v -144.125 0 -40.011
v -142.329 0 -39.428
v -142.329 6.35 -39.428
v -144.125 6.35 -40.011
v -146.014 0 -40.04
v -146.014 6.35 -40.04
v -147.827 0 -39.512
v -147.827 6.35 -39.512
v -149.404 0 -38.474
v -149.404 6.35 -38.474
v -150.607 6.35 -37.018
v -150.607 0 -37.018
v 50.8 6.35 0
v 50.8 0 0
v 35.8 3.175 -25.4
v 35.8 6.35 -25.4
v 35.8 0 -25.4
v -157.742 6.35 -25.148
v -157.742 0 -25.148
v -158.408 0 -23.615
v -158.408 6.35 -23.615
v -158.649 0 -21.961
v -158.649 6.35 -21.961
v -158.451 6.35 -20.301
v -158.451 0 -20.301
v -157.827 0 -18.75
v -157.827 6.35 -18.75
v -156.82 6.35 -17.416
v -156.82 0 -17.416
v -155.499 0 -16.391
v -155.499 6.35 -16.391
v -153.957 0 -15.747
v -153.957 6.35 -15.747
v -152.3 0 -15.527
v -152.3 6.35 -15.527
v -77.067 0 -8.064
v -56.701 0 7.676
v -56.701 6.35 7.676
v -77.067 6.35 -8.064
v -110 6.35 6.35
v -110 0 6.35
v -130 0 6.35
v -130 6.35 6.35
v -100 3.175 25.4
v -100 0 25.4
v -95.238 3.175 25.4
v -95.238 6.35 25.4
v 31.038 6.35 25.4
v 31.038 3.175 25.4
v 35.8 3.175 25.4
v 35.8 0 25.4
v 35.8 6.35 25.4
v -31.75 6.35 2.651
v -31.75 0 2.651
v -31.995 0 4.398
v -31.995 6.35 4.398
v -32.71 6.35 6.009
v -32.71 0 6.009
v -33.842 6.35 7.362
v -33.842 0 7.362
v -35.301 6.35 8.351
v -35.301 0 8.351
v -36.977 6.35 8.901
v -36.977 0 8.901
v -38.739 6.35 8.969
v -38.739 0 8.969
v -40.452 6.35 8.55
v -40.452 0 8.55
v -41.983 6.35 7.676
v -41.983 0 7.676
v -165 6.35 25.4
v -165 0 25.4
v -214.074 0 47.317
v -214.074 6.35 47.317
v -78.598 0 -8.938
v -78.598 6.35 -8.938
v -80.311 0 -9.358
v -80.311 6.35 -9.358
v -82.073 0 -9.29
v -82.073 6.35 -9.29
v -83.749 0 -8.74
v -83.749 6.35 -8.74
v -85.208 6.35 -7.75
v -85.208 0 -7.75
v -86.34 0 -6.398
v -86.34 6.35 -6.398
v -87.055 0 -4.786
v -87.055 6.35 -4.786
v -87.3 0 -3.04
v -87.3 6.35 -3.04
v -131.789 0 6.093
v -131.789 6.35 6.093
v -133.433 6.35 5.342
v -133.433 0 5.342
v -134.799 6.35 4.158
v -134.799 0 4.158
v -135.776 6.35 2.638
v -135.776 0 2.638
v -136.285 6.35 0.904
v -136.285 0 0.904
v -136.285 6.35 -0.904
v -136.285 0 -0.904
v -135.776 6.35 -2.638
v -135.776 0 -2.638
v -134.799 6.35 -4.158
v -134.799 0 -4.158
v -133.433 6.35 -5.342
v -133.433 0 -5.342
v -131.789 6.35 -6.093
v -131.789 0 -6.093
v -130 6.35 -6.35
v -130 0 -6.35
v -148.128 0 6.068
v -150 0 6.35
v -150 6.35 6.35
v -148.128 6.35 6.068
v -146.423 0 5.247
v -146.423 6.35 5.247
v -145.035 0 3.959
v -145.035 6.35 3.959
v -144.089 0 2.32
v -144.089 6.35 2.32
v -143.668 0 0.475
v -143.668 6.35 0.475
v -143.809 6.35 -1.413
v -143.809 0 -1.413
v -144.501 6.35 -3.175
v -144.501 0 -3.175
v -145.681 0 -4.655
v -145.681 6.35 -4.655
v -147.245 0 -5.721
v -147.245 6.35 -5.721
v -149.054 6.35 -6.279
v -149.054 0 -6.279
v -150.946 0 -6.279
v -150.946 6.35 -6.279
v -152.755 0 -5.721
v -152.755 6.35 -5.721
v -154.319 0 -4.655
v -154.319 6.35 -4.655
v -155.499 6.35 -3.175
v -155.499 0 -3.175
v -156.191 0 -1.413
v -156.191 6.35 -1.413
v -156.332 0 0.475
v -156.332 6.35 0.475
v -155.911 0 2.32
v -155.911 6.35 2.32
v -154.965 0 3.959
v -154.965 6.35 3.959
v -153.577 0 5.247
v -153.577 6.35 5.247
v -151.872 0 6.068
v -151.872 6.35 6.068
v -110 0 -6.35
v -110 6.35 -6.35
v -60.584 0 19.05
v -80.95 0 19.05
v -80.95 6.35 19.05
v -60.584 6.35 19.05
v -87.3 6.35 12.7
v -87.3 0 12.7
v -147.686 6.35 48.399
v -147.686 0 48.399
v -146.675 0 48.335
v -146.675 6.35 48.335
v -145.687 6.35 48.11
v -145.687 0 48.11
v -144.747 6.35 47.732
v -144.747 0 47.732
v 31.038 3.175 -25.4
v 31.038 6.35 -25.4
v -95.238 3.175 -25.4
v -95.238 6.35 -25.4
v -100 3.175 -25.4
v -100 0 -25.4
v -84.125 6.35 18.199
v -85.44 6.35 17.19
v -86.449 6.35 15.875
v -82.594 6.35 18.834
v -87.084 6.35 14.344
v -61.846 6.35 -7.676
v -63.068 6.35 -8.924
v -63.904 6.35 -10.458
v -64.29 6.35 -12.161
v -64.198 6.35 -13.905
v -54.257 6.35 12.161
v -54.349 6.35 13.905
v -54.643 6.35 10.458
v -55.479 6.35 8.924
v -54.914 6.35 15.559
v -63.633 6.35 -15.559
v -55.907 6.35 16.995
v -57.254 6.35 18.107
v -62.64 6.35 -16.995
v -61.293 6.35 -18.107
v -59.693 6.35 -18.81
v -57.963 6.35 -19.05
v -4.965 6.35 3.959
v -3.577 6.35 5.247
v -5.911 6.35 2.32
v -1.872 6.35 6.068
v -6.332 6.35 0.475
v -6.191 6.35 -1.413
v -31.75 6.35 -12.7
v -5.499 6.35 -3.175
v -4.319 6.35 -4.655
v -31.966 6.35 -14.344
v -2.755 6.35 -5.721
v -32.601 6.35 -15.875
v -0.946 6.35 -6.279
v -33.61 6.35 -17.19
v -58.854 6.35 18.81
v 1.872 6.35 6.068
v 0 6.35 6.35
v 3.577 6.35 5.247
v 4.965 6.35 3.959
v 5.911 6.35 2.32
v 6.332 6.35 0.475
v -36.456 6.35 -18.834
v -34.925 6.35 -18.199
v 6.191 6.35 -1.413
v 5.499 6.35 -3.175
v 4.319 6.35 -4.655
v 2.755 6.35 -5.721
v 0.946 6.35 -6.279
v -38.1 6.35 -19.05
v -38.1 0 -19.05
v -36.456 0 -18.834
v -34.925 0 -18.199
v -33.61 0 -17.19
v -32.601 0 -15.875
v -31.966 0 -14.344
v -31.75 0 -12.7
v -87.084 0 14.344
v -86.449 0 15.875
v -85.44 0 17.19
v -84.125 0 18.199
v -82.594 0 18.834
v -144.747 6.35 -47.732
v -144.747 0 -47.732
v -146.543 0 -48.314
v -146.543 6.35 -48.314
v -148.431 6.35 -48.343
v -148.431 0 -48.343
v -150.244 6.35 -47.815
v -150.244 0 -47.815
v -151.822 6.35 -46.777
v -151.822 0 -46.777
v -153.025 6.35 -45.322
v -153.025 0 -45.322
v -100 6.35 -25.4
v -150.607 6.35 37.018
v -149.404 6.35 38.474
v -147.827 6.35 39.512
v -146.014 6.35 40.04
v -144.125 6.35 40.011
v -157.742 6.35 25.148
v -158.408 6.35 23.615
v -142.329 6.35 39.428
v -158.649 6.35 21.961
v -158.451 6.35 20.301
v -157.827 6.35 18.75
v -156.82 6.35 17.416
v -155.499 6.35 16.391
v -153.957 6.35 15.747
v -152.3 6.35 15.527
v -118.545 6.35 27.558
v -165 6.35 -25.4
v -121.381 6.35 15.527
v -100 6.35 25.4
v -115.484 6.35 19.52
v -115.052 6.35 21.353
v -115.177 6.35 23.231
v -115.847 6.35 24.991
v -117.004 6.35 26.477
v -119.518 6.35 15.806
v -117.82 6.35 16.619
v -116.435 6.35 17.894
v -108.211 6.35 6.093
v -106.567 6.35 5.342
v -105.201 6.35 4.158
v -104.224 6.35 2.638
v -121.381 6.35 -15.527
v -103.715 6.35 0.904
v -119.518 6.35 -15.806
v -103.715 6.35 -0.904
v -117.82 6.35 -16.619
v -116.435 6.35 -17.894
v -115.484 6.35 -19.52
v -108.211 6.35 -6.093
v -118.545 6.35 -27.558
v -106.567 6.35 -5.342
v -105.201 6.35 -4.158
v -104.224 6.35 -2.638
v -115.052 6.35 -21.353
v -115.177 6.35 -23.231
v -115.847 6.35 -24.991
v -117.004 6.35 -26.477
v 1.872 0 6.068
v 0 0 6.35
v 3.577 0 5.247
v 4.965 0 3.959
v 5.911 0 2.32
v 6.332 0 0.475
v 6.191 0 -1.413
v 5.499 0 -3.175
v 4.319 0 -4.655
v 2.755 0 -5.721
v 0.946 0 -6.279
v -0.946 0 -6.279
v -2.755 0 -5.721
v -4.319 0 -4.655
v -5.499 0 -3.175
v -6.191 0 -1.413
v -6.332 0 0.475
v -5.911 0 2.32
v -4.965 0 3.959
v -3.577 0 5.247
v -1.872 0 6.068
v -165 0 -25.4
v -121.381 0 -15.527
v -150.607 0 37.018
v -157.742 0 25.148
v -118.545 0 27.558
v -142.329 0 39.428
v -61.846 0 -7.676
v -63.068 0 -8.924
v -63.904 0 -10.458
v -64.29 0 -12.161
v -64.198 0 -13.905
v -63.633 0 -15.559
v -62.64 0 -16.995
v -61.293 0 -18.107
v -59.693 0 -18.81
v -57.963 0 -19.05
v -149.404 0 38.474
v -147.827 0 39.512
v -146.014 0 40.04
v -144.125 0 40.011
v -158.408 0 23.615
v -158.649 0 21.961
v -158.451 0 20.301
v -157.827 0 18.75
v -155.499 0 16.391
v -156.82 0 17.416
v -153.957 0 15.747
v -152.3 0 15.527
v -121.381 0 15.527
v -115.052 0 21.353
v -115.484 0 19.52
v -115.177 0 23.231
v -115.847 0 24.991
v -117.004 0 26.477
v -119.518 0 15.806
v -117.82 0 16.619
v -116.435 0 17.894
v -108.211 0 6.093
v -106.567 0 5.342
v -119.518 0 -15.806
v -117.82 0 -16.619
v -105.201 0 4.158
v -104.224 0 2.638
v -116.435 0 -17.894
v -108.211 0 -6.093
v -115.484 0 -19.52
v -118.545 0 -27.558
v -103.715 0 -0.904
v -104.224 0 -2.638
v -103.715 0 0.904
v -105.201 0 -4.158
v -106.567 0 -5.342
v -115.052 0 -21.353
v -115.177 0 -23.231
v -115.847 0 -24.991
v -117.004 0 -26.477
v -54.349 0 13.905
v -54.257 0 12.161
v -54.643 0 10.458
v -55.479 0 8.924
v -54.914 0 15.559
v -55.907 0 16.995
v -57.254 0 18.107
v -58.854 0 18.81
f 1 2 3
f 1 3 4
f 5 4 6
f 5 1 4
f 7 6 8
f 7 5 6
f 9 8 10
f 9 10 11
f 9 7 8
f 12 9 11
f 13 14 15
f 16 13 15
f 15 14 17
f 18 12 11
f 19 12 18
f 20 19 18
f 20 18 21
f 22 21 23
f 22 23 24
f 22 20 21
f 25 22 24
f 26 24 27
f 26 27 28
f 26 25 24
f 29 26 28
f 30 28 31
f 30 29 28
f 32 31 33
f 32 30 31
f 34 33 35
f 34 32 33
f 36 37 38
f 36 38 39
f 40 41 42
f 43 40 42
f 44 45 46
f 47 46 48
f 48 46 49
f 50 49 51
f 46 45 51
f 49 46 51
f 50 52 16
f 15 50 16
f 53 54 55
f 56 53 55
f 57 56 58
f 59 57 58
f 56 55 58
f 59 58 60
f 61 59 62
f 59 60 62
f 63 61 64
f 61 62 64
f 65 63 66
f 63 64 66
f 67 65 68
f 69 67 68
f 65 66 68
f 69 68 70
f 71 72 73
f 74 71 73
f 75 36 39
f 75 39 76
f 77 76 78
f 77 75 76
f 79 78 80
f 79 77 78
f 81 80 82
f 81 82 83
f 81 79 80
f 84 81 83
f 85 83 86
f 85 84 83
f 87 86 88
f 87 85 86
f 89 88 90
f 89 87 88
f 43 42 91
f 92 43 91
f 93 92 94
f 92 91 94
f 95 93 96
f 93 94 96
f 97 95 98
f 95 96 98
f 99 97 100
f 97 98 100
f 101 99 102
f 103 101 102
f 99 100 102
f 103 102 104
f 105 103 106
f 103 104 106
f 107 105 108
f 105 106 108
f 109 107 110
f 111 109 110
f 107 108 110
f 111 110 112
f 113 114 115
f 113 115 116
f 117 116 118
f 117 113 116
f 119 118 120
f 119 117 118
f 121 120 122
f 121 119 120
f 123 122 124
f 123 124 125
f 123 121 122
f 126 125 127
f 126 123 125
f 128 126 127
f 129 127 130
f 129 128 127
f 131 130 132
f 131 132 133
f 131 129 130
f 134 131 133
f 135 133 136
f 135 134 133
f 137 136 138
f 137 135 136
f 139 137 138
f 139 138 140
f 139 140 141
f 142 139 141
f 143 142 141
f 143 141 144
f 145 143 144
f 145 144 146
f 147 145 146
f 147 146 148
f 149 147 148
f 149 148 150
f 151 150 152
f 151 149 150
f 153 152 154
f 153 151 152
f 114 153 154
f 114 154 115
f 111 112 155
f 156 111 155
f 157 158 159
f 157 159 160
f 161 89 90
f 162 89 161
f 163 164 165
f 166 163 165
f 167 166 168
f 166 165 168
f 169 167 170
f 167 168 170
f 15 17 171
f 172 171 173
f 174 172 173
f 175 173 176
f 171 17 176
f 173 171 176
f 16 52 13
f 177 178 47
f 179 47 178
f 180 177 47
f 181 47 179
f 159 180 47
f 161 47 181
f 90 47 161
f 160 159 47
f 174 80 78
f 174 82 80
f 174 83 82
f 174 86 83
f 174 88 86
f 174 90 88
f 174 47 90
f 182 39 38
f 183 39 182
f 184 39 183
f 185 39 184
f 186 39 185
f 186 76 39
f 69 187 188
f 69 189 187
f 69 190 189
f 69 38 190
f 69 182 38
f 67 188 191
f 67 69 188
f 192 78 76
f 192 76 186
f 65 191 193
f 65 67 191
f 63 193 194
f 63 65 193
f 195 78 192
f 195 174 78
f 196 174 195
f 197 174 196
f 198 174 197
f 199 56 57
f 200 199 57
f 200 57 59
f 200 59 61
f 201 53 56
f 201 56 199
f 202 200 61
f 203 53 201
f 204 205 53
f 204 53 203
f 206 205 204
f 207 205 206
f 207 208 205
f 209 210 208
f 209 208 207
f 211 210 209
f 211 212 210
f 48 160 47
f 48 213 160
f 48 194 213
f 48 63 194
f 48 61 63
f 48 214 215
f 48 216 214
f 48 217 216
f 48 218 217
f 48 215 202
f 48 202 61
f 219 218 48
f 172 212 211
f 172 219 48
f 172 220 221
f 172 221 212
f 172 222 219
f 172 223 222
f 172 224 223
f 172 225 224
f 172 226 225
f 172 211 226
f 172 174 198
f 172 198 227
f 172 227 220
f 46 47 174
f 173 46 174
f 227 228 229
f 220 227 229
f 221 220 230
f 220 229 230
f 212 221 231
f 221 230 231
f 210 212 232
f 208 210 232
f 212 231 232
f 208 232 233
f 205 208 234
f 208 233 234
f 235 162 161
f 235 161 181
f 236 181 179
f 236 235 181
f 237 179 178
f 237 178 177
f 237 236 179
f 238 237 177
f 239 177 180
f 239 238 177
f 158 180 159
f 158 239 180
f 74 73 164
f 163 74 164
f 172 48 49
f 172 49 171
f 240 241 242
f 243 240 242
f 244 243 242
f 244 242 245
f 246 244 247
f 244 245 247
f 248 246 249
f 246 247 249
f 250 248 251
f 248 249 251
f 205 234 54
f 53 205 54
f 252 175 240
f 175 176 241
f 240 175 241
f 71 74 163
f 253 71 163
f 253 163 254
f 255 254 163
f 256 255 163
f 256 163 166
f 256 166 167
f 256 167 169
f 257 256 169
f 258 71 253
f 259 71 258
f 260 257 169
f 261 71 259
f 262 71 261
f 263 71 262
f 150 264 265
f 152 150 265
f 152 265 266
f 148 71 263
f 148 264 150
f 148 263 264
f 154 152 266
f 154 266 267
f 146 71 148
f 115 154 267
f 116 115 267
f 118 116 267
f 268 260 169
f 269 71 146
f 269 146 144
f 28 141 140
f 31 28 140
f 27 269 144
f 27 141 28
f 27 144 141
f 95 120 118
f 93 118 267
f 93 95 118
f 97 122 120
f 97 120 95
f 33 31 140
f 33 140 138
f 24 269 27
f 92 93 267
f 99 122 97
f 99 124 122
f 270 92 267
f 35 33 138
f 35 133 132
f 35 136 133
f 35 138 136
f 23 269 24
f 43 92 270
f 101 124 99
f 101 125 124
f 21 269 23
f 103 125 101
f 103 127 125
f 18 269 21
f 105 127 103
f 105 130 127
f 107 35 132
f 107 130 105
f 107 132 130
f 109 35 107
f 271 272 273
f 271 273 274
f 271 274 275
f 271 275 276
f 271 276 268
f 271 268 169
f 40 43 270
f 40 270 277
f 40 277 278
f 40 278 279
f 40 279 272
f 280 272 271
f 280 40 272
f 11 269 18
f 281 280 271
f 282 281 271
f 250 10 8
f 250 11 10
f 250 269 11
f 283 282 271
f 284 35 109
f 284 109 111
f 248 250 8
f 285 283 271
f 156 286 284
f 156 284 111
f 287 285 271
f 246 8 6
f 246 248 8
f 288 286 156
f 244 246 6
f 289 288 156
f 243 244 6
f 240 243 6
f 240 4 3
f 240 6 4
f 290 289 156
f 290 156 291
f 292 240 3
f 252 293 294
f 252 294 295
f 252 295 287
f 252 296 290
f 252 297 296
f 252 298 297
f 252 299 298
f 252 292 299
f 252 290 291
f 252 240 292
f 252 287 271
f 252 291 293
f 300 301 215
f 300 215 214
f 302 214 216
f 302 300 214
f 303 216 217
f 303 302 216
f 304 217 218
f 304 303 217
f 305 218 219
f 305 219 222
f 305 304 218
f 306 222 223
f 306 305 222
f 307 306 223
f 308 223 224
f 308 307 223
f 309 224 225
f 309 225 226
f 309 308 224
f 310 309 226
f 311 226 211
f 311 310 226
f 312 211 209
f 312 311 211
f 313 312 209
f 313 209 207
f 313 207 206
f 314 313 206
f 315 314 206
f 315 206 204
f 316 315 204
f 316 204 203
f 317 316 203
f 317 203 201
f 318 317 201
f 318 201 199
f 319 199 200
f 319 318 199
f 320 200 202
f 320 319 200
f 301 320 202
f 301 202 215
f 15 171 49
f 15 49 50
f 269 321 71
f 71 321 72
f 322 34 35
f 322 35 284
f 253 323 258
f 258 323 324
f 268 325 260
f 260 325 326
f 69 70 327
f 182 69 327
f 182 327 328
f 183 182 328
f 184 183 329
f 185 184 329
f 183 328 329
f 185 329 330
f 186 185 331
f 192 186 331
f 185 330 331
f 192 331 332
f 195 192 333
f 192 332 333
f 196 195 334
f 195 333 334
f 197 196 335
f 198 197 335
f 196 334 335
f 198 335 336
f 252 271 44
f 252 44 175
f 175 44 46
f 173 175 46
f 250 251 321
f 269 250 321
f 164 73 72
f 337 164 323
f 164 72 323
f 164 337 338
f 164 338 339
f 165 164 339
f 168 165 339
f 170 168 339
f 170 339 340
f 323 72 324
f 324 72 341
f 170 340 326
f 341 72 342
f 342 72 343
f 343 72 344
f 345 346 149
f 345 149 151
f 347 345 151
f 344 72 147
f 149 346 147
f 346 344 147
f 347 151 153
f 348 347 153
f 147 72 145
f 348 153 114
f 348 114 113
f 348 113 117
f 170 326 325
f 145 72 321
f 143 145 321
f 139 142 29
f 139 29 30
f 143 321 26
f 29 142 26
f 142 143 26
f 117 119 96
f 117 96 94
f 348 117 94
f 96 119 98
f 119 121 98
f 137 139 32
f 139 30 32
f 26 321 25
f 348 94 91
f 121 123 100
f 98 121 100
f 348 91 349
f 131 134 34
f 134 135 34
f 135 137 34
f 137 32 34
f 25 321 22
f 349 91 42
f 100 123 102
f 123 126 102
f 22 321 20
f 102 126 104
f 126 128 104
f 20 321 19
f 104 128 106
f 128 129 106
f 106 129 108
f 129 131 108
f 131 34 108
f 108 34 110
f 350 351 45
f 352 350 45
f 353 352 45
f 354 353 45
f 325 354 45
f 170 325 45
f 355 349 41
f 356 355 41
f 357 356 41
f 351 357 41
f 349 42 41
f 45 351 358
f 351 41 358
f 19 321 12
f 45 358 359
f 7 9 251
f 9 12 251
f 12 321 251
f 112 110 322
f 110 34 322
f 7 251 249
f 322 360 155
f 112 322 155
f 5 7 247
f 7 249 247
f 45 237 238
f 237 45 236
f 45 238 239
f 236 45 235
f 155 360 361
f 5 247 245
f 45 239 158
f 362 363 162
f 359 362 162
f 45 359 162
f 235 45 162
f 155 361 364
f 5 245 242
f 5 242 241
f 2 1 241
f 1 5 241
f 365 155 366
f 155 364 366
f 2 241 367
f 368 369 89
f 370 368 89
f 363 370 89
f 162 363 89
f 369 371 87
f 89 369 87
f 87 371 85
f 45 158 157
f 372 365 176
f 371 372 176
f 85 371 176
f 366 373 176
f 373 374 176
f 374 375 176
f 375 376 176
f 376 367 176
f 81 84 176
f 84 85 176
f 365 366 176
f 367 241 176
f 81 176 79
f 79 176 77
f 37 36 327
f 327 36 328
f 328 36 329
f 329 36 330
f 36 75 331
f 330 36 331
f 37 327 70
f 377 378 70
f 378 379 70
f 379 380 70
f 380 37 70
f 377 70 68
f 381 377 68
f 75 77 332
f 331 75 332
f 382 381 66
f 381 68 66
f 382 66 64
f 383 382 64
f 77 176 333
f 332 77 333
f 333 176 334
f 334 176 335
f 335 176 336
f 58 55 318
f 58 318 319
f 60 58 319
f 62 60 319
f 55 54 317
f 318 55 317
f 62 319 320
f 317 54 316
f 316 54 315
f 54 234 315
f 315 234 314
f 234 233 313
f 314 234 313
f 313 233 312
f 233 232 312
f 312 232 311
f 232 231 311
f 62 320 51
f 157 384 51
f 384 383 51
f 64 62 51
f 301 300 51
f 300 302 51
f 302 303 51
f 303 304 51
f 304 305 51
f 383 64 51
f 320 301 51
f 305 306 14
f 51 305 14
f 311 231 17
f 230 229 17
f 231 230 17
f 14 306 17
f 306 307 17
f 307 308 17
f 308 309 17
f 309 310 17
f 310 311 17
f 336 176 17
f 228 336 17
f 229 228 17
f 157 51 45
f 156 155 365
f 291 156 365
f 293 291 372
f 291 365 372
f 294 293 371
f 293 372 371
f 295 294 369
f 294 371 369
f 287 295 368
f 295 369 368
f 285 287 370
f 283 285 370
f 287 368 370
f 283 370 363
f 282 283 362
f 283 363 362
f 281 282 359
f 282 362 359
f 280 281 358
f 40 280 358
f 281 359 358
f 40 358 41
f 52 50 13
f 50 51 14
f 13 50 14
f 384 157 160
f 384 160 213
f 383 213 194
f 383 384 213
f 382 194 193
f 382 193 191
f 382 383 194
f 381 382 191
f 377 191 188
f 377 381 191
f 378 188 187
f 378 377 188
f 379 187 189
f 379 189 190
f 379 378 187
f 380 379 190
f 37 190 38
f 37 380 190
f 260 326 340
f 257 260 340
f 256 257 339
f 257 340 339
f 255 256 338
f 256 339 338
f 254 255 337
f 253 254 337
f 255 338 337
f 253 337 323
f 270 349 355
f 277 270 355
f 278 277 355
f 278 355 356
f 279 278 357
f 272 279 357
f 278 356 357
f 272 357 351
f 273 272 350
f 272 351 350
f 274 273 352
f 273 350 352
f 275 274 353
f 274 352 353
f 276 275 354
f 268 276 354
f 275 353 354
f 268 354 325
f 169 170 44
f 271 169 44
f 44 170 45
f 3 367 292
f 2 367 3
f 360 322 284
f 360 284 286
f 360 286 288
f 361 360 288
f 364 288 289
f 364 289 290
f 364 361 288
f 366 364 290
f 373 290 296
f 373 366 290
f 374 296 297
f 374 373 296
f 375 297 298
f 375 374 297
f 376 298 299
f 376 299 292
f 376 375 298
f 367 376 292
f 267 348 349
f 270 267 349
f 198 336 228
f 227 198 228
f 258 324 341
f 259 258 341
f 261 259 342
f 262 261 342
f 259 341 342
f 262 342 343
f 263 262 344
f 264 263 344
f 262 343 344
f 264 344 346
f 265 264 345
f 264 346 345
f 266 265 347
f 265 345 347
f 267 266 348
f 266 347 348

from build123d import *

# Parameters (mm, degrees)
CROQUIS1_R              = 6.35
SALIENTE_EXTRUIR1_DEPTH = 6.35
CROQUIS4_W              = 4.7625
CROQUIS4_H              = 50.8
CORTAR_EXTRUIR1_DEPTH   = 3.175


with BuildPart() as part:
    # Croquis1 → Saliente-Extruir1 (new body)
    with BuildSketch(Plane(origin=(0, 0, 0), x_dir=(1, 0, 0), z_dir=(0, 1, 0))):
        with BuildLine():
            Line((35.8, -25.4), (50.8, 0))
            Line((50.8, 0), (35.8, 25.4))
            Line((35.8, 25.4), (-100, 25.4))
            Line((-100, 25.4), (-144.746813481, 47.731727951))
            ThreePointArc((-144.746813481, 47.731727951), (-149.357530471, 48.146831931), (-153.024774803, 45.321528145))
            Line((-153.024774803, 45.321528145), (-165, 25.4))
            Line((-165, 25.4), (-165, -25.4))
            Line((-165, -25.4), (-214.07384035, -47.316891892))
            Line((-214.07384035, -47.316891892), (-147.685890016, -48.399156383))
            ThreePointArc((-147.685890016, -48.399156383), (-146.176180179, -48.24234101), (-144.746813481, -47.731727951))
            Line((-144.746813481, -47.731727951), (-100, -25.4))
            Line((-100, -25.4), (35.8, -25.4))
        make_face()
        with Locations(Location((0, 0, 0), (0, 0, 270))):
            Circle(CROQUIS1_R, mode=Mode.SUBTRACT)
        with Locations(Location((-150, 0, 0), (0, 0, 270))):
            Circle(CROQUIS1_R, mode=Mode.SUBTRACT)
        with BuildLine():
            Line((-118.545100716, 27.558404082), (-142.329198773, 39.428299747))
            ThreePointArc((-142.329198773, 39.428299747), (-146.939915763, 39.843403727), (-150.607160095, 37.018099941))
            Line((-150.607160095, 37.018099941), (-157.742389512, 25.148204276))
            ThreePointArc((-157.742389512, 25.148204276), (-157.827056347, 18.750312726), (-152.3, 15.526676131))
            Line((-152.3, 15.526676131), (-121.380672526, 15.526676131))
            ThreePointArc((-121.380672526, 15.526676131), (-115.199998109, 20.420048603), (-118.545100716, 27.558404082))
        make_face(mode=Mode.SUBTRACT)
        with BuildLine():
            Line((-118.545100716, -27.558404082), (-142.329198773, -39.428299747))
            ThreePointArc((-142.329198773, -39.428299747), (-146.939915763, -39.843403727), (-150.607160095, -37.018099941))
            Line((-150.607160095, -37.018099941), (-157.742389512, -25.148204276))
            ThreePointArc((-157.742389512, -25.148204276), (-157.827056347, -18.750312726), (-152.3, -15.526676131))
            Line((-152.3, -15.526676131), (-121.380672526, -15.526676131))
            ThreePointArc((-121.380672526, -15.526676131), (-115.199998109, -20.420048603), (-118.545100716, -27.558404082))
        make_face(mode=Mode.SUBTRACT)
        with BuildLine():
            Line((-130, 6.35), (-110, 6.35))
            ThreePointArc((-110, 6.35), (-103.65, 0), (-110, -6.35))
            Line((-110, -6.35), (-130, -6.35))
            ThreePointArc((-130, -6.35), (-136.35, 0), (-130, 6.35))
        make_face(mode=Mode.SUBTRACT)
        with BuildLine():
            Line((-56.70082756, -7.67562673), (-77.066937646, 8.064222026))
            ThreePointArc((-77.066937646, 8.064222026), (-83.748665223, 8.739846385), (-87.3, 3.039848756))
            Line((-87.3, 3.039848756), (-87.3, -12.7))
            ThreePointArc((-87.3, -12.7), (-85.440128061, -17.190128061), (-80.95, -19.05))
            Line((-80.95, -19.05), (-60.583889913, -19.05))
            ThreePointArc((-60.583889913, -19.05), (-54.57442778, -14.751551819), (-56.70082756, -7.67562673))
        make_face(mode=Mode.SUBTRACT)
        with BuildLine():
            Line((-57.963298738, 19.05), (-38.1, 19.05))
            ThreePointArc((-38.1, 19.05), (-33.609871939, 17.190128061), (-31.75, 12.7))
            Line((-31.75, 12.7), (-31.75, -2.651253459))
            ThreePointArc((-31.75, -2.651253459), (-35.301334777, -8.351251089), (-41.983062354, -7.67562673))
            Line((-41.983062354, -7.67562673), (-61.846361092, 7.67562673))
            ThreePointArc((-61.846361092, 7.67562673), (-63.972760872, 14.751551819), (-57.963298738, 19.05))
        make_face(mode=Mode.SUBTRACT)
    extrude(amount=SALIENTE_EXTRUIR1_DEPTH)

    # Croquis4 → Cortar-Extruir1 (cut)
    with BuildSketch(Plane(origin=(0, 6.35, 0), x_dir=(1, 0, 0), z_dir=(0, 1, 0))):
        with Locations((-97.61875, 0)):
            Rectangle(CROQUIS4_W, CROQUIS4_H)
        with Locations((33.41875, 0)):
            Rectangle(CROQUIS4_W, CROQUIS4_H)
    extrude(amount=-CORTAR_EXTRUIR1_DEPTH, mode=Mode.SUBTRACT)


solid = part.part
